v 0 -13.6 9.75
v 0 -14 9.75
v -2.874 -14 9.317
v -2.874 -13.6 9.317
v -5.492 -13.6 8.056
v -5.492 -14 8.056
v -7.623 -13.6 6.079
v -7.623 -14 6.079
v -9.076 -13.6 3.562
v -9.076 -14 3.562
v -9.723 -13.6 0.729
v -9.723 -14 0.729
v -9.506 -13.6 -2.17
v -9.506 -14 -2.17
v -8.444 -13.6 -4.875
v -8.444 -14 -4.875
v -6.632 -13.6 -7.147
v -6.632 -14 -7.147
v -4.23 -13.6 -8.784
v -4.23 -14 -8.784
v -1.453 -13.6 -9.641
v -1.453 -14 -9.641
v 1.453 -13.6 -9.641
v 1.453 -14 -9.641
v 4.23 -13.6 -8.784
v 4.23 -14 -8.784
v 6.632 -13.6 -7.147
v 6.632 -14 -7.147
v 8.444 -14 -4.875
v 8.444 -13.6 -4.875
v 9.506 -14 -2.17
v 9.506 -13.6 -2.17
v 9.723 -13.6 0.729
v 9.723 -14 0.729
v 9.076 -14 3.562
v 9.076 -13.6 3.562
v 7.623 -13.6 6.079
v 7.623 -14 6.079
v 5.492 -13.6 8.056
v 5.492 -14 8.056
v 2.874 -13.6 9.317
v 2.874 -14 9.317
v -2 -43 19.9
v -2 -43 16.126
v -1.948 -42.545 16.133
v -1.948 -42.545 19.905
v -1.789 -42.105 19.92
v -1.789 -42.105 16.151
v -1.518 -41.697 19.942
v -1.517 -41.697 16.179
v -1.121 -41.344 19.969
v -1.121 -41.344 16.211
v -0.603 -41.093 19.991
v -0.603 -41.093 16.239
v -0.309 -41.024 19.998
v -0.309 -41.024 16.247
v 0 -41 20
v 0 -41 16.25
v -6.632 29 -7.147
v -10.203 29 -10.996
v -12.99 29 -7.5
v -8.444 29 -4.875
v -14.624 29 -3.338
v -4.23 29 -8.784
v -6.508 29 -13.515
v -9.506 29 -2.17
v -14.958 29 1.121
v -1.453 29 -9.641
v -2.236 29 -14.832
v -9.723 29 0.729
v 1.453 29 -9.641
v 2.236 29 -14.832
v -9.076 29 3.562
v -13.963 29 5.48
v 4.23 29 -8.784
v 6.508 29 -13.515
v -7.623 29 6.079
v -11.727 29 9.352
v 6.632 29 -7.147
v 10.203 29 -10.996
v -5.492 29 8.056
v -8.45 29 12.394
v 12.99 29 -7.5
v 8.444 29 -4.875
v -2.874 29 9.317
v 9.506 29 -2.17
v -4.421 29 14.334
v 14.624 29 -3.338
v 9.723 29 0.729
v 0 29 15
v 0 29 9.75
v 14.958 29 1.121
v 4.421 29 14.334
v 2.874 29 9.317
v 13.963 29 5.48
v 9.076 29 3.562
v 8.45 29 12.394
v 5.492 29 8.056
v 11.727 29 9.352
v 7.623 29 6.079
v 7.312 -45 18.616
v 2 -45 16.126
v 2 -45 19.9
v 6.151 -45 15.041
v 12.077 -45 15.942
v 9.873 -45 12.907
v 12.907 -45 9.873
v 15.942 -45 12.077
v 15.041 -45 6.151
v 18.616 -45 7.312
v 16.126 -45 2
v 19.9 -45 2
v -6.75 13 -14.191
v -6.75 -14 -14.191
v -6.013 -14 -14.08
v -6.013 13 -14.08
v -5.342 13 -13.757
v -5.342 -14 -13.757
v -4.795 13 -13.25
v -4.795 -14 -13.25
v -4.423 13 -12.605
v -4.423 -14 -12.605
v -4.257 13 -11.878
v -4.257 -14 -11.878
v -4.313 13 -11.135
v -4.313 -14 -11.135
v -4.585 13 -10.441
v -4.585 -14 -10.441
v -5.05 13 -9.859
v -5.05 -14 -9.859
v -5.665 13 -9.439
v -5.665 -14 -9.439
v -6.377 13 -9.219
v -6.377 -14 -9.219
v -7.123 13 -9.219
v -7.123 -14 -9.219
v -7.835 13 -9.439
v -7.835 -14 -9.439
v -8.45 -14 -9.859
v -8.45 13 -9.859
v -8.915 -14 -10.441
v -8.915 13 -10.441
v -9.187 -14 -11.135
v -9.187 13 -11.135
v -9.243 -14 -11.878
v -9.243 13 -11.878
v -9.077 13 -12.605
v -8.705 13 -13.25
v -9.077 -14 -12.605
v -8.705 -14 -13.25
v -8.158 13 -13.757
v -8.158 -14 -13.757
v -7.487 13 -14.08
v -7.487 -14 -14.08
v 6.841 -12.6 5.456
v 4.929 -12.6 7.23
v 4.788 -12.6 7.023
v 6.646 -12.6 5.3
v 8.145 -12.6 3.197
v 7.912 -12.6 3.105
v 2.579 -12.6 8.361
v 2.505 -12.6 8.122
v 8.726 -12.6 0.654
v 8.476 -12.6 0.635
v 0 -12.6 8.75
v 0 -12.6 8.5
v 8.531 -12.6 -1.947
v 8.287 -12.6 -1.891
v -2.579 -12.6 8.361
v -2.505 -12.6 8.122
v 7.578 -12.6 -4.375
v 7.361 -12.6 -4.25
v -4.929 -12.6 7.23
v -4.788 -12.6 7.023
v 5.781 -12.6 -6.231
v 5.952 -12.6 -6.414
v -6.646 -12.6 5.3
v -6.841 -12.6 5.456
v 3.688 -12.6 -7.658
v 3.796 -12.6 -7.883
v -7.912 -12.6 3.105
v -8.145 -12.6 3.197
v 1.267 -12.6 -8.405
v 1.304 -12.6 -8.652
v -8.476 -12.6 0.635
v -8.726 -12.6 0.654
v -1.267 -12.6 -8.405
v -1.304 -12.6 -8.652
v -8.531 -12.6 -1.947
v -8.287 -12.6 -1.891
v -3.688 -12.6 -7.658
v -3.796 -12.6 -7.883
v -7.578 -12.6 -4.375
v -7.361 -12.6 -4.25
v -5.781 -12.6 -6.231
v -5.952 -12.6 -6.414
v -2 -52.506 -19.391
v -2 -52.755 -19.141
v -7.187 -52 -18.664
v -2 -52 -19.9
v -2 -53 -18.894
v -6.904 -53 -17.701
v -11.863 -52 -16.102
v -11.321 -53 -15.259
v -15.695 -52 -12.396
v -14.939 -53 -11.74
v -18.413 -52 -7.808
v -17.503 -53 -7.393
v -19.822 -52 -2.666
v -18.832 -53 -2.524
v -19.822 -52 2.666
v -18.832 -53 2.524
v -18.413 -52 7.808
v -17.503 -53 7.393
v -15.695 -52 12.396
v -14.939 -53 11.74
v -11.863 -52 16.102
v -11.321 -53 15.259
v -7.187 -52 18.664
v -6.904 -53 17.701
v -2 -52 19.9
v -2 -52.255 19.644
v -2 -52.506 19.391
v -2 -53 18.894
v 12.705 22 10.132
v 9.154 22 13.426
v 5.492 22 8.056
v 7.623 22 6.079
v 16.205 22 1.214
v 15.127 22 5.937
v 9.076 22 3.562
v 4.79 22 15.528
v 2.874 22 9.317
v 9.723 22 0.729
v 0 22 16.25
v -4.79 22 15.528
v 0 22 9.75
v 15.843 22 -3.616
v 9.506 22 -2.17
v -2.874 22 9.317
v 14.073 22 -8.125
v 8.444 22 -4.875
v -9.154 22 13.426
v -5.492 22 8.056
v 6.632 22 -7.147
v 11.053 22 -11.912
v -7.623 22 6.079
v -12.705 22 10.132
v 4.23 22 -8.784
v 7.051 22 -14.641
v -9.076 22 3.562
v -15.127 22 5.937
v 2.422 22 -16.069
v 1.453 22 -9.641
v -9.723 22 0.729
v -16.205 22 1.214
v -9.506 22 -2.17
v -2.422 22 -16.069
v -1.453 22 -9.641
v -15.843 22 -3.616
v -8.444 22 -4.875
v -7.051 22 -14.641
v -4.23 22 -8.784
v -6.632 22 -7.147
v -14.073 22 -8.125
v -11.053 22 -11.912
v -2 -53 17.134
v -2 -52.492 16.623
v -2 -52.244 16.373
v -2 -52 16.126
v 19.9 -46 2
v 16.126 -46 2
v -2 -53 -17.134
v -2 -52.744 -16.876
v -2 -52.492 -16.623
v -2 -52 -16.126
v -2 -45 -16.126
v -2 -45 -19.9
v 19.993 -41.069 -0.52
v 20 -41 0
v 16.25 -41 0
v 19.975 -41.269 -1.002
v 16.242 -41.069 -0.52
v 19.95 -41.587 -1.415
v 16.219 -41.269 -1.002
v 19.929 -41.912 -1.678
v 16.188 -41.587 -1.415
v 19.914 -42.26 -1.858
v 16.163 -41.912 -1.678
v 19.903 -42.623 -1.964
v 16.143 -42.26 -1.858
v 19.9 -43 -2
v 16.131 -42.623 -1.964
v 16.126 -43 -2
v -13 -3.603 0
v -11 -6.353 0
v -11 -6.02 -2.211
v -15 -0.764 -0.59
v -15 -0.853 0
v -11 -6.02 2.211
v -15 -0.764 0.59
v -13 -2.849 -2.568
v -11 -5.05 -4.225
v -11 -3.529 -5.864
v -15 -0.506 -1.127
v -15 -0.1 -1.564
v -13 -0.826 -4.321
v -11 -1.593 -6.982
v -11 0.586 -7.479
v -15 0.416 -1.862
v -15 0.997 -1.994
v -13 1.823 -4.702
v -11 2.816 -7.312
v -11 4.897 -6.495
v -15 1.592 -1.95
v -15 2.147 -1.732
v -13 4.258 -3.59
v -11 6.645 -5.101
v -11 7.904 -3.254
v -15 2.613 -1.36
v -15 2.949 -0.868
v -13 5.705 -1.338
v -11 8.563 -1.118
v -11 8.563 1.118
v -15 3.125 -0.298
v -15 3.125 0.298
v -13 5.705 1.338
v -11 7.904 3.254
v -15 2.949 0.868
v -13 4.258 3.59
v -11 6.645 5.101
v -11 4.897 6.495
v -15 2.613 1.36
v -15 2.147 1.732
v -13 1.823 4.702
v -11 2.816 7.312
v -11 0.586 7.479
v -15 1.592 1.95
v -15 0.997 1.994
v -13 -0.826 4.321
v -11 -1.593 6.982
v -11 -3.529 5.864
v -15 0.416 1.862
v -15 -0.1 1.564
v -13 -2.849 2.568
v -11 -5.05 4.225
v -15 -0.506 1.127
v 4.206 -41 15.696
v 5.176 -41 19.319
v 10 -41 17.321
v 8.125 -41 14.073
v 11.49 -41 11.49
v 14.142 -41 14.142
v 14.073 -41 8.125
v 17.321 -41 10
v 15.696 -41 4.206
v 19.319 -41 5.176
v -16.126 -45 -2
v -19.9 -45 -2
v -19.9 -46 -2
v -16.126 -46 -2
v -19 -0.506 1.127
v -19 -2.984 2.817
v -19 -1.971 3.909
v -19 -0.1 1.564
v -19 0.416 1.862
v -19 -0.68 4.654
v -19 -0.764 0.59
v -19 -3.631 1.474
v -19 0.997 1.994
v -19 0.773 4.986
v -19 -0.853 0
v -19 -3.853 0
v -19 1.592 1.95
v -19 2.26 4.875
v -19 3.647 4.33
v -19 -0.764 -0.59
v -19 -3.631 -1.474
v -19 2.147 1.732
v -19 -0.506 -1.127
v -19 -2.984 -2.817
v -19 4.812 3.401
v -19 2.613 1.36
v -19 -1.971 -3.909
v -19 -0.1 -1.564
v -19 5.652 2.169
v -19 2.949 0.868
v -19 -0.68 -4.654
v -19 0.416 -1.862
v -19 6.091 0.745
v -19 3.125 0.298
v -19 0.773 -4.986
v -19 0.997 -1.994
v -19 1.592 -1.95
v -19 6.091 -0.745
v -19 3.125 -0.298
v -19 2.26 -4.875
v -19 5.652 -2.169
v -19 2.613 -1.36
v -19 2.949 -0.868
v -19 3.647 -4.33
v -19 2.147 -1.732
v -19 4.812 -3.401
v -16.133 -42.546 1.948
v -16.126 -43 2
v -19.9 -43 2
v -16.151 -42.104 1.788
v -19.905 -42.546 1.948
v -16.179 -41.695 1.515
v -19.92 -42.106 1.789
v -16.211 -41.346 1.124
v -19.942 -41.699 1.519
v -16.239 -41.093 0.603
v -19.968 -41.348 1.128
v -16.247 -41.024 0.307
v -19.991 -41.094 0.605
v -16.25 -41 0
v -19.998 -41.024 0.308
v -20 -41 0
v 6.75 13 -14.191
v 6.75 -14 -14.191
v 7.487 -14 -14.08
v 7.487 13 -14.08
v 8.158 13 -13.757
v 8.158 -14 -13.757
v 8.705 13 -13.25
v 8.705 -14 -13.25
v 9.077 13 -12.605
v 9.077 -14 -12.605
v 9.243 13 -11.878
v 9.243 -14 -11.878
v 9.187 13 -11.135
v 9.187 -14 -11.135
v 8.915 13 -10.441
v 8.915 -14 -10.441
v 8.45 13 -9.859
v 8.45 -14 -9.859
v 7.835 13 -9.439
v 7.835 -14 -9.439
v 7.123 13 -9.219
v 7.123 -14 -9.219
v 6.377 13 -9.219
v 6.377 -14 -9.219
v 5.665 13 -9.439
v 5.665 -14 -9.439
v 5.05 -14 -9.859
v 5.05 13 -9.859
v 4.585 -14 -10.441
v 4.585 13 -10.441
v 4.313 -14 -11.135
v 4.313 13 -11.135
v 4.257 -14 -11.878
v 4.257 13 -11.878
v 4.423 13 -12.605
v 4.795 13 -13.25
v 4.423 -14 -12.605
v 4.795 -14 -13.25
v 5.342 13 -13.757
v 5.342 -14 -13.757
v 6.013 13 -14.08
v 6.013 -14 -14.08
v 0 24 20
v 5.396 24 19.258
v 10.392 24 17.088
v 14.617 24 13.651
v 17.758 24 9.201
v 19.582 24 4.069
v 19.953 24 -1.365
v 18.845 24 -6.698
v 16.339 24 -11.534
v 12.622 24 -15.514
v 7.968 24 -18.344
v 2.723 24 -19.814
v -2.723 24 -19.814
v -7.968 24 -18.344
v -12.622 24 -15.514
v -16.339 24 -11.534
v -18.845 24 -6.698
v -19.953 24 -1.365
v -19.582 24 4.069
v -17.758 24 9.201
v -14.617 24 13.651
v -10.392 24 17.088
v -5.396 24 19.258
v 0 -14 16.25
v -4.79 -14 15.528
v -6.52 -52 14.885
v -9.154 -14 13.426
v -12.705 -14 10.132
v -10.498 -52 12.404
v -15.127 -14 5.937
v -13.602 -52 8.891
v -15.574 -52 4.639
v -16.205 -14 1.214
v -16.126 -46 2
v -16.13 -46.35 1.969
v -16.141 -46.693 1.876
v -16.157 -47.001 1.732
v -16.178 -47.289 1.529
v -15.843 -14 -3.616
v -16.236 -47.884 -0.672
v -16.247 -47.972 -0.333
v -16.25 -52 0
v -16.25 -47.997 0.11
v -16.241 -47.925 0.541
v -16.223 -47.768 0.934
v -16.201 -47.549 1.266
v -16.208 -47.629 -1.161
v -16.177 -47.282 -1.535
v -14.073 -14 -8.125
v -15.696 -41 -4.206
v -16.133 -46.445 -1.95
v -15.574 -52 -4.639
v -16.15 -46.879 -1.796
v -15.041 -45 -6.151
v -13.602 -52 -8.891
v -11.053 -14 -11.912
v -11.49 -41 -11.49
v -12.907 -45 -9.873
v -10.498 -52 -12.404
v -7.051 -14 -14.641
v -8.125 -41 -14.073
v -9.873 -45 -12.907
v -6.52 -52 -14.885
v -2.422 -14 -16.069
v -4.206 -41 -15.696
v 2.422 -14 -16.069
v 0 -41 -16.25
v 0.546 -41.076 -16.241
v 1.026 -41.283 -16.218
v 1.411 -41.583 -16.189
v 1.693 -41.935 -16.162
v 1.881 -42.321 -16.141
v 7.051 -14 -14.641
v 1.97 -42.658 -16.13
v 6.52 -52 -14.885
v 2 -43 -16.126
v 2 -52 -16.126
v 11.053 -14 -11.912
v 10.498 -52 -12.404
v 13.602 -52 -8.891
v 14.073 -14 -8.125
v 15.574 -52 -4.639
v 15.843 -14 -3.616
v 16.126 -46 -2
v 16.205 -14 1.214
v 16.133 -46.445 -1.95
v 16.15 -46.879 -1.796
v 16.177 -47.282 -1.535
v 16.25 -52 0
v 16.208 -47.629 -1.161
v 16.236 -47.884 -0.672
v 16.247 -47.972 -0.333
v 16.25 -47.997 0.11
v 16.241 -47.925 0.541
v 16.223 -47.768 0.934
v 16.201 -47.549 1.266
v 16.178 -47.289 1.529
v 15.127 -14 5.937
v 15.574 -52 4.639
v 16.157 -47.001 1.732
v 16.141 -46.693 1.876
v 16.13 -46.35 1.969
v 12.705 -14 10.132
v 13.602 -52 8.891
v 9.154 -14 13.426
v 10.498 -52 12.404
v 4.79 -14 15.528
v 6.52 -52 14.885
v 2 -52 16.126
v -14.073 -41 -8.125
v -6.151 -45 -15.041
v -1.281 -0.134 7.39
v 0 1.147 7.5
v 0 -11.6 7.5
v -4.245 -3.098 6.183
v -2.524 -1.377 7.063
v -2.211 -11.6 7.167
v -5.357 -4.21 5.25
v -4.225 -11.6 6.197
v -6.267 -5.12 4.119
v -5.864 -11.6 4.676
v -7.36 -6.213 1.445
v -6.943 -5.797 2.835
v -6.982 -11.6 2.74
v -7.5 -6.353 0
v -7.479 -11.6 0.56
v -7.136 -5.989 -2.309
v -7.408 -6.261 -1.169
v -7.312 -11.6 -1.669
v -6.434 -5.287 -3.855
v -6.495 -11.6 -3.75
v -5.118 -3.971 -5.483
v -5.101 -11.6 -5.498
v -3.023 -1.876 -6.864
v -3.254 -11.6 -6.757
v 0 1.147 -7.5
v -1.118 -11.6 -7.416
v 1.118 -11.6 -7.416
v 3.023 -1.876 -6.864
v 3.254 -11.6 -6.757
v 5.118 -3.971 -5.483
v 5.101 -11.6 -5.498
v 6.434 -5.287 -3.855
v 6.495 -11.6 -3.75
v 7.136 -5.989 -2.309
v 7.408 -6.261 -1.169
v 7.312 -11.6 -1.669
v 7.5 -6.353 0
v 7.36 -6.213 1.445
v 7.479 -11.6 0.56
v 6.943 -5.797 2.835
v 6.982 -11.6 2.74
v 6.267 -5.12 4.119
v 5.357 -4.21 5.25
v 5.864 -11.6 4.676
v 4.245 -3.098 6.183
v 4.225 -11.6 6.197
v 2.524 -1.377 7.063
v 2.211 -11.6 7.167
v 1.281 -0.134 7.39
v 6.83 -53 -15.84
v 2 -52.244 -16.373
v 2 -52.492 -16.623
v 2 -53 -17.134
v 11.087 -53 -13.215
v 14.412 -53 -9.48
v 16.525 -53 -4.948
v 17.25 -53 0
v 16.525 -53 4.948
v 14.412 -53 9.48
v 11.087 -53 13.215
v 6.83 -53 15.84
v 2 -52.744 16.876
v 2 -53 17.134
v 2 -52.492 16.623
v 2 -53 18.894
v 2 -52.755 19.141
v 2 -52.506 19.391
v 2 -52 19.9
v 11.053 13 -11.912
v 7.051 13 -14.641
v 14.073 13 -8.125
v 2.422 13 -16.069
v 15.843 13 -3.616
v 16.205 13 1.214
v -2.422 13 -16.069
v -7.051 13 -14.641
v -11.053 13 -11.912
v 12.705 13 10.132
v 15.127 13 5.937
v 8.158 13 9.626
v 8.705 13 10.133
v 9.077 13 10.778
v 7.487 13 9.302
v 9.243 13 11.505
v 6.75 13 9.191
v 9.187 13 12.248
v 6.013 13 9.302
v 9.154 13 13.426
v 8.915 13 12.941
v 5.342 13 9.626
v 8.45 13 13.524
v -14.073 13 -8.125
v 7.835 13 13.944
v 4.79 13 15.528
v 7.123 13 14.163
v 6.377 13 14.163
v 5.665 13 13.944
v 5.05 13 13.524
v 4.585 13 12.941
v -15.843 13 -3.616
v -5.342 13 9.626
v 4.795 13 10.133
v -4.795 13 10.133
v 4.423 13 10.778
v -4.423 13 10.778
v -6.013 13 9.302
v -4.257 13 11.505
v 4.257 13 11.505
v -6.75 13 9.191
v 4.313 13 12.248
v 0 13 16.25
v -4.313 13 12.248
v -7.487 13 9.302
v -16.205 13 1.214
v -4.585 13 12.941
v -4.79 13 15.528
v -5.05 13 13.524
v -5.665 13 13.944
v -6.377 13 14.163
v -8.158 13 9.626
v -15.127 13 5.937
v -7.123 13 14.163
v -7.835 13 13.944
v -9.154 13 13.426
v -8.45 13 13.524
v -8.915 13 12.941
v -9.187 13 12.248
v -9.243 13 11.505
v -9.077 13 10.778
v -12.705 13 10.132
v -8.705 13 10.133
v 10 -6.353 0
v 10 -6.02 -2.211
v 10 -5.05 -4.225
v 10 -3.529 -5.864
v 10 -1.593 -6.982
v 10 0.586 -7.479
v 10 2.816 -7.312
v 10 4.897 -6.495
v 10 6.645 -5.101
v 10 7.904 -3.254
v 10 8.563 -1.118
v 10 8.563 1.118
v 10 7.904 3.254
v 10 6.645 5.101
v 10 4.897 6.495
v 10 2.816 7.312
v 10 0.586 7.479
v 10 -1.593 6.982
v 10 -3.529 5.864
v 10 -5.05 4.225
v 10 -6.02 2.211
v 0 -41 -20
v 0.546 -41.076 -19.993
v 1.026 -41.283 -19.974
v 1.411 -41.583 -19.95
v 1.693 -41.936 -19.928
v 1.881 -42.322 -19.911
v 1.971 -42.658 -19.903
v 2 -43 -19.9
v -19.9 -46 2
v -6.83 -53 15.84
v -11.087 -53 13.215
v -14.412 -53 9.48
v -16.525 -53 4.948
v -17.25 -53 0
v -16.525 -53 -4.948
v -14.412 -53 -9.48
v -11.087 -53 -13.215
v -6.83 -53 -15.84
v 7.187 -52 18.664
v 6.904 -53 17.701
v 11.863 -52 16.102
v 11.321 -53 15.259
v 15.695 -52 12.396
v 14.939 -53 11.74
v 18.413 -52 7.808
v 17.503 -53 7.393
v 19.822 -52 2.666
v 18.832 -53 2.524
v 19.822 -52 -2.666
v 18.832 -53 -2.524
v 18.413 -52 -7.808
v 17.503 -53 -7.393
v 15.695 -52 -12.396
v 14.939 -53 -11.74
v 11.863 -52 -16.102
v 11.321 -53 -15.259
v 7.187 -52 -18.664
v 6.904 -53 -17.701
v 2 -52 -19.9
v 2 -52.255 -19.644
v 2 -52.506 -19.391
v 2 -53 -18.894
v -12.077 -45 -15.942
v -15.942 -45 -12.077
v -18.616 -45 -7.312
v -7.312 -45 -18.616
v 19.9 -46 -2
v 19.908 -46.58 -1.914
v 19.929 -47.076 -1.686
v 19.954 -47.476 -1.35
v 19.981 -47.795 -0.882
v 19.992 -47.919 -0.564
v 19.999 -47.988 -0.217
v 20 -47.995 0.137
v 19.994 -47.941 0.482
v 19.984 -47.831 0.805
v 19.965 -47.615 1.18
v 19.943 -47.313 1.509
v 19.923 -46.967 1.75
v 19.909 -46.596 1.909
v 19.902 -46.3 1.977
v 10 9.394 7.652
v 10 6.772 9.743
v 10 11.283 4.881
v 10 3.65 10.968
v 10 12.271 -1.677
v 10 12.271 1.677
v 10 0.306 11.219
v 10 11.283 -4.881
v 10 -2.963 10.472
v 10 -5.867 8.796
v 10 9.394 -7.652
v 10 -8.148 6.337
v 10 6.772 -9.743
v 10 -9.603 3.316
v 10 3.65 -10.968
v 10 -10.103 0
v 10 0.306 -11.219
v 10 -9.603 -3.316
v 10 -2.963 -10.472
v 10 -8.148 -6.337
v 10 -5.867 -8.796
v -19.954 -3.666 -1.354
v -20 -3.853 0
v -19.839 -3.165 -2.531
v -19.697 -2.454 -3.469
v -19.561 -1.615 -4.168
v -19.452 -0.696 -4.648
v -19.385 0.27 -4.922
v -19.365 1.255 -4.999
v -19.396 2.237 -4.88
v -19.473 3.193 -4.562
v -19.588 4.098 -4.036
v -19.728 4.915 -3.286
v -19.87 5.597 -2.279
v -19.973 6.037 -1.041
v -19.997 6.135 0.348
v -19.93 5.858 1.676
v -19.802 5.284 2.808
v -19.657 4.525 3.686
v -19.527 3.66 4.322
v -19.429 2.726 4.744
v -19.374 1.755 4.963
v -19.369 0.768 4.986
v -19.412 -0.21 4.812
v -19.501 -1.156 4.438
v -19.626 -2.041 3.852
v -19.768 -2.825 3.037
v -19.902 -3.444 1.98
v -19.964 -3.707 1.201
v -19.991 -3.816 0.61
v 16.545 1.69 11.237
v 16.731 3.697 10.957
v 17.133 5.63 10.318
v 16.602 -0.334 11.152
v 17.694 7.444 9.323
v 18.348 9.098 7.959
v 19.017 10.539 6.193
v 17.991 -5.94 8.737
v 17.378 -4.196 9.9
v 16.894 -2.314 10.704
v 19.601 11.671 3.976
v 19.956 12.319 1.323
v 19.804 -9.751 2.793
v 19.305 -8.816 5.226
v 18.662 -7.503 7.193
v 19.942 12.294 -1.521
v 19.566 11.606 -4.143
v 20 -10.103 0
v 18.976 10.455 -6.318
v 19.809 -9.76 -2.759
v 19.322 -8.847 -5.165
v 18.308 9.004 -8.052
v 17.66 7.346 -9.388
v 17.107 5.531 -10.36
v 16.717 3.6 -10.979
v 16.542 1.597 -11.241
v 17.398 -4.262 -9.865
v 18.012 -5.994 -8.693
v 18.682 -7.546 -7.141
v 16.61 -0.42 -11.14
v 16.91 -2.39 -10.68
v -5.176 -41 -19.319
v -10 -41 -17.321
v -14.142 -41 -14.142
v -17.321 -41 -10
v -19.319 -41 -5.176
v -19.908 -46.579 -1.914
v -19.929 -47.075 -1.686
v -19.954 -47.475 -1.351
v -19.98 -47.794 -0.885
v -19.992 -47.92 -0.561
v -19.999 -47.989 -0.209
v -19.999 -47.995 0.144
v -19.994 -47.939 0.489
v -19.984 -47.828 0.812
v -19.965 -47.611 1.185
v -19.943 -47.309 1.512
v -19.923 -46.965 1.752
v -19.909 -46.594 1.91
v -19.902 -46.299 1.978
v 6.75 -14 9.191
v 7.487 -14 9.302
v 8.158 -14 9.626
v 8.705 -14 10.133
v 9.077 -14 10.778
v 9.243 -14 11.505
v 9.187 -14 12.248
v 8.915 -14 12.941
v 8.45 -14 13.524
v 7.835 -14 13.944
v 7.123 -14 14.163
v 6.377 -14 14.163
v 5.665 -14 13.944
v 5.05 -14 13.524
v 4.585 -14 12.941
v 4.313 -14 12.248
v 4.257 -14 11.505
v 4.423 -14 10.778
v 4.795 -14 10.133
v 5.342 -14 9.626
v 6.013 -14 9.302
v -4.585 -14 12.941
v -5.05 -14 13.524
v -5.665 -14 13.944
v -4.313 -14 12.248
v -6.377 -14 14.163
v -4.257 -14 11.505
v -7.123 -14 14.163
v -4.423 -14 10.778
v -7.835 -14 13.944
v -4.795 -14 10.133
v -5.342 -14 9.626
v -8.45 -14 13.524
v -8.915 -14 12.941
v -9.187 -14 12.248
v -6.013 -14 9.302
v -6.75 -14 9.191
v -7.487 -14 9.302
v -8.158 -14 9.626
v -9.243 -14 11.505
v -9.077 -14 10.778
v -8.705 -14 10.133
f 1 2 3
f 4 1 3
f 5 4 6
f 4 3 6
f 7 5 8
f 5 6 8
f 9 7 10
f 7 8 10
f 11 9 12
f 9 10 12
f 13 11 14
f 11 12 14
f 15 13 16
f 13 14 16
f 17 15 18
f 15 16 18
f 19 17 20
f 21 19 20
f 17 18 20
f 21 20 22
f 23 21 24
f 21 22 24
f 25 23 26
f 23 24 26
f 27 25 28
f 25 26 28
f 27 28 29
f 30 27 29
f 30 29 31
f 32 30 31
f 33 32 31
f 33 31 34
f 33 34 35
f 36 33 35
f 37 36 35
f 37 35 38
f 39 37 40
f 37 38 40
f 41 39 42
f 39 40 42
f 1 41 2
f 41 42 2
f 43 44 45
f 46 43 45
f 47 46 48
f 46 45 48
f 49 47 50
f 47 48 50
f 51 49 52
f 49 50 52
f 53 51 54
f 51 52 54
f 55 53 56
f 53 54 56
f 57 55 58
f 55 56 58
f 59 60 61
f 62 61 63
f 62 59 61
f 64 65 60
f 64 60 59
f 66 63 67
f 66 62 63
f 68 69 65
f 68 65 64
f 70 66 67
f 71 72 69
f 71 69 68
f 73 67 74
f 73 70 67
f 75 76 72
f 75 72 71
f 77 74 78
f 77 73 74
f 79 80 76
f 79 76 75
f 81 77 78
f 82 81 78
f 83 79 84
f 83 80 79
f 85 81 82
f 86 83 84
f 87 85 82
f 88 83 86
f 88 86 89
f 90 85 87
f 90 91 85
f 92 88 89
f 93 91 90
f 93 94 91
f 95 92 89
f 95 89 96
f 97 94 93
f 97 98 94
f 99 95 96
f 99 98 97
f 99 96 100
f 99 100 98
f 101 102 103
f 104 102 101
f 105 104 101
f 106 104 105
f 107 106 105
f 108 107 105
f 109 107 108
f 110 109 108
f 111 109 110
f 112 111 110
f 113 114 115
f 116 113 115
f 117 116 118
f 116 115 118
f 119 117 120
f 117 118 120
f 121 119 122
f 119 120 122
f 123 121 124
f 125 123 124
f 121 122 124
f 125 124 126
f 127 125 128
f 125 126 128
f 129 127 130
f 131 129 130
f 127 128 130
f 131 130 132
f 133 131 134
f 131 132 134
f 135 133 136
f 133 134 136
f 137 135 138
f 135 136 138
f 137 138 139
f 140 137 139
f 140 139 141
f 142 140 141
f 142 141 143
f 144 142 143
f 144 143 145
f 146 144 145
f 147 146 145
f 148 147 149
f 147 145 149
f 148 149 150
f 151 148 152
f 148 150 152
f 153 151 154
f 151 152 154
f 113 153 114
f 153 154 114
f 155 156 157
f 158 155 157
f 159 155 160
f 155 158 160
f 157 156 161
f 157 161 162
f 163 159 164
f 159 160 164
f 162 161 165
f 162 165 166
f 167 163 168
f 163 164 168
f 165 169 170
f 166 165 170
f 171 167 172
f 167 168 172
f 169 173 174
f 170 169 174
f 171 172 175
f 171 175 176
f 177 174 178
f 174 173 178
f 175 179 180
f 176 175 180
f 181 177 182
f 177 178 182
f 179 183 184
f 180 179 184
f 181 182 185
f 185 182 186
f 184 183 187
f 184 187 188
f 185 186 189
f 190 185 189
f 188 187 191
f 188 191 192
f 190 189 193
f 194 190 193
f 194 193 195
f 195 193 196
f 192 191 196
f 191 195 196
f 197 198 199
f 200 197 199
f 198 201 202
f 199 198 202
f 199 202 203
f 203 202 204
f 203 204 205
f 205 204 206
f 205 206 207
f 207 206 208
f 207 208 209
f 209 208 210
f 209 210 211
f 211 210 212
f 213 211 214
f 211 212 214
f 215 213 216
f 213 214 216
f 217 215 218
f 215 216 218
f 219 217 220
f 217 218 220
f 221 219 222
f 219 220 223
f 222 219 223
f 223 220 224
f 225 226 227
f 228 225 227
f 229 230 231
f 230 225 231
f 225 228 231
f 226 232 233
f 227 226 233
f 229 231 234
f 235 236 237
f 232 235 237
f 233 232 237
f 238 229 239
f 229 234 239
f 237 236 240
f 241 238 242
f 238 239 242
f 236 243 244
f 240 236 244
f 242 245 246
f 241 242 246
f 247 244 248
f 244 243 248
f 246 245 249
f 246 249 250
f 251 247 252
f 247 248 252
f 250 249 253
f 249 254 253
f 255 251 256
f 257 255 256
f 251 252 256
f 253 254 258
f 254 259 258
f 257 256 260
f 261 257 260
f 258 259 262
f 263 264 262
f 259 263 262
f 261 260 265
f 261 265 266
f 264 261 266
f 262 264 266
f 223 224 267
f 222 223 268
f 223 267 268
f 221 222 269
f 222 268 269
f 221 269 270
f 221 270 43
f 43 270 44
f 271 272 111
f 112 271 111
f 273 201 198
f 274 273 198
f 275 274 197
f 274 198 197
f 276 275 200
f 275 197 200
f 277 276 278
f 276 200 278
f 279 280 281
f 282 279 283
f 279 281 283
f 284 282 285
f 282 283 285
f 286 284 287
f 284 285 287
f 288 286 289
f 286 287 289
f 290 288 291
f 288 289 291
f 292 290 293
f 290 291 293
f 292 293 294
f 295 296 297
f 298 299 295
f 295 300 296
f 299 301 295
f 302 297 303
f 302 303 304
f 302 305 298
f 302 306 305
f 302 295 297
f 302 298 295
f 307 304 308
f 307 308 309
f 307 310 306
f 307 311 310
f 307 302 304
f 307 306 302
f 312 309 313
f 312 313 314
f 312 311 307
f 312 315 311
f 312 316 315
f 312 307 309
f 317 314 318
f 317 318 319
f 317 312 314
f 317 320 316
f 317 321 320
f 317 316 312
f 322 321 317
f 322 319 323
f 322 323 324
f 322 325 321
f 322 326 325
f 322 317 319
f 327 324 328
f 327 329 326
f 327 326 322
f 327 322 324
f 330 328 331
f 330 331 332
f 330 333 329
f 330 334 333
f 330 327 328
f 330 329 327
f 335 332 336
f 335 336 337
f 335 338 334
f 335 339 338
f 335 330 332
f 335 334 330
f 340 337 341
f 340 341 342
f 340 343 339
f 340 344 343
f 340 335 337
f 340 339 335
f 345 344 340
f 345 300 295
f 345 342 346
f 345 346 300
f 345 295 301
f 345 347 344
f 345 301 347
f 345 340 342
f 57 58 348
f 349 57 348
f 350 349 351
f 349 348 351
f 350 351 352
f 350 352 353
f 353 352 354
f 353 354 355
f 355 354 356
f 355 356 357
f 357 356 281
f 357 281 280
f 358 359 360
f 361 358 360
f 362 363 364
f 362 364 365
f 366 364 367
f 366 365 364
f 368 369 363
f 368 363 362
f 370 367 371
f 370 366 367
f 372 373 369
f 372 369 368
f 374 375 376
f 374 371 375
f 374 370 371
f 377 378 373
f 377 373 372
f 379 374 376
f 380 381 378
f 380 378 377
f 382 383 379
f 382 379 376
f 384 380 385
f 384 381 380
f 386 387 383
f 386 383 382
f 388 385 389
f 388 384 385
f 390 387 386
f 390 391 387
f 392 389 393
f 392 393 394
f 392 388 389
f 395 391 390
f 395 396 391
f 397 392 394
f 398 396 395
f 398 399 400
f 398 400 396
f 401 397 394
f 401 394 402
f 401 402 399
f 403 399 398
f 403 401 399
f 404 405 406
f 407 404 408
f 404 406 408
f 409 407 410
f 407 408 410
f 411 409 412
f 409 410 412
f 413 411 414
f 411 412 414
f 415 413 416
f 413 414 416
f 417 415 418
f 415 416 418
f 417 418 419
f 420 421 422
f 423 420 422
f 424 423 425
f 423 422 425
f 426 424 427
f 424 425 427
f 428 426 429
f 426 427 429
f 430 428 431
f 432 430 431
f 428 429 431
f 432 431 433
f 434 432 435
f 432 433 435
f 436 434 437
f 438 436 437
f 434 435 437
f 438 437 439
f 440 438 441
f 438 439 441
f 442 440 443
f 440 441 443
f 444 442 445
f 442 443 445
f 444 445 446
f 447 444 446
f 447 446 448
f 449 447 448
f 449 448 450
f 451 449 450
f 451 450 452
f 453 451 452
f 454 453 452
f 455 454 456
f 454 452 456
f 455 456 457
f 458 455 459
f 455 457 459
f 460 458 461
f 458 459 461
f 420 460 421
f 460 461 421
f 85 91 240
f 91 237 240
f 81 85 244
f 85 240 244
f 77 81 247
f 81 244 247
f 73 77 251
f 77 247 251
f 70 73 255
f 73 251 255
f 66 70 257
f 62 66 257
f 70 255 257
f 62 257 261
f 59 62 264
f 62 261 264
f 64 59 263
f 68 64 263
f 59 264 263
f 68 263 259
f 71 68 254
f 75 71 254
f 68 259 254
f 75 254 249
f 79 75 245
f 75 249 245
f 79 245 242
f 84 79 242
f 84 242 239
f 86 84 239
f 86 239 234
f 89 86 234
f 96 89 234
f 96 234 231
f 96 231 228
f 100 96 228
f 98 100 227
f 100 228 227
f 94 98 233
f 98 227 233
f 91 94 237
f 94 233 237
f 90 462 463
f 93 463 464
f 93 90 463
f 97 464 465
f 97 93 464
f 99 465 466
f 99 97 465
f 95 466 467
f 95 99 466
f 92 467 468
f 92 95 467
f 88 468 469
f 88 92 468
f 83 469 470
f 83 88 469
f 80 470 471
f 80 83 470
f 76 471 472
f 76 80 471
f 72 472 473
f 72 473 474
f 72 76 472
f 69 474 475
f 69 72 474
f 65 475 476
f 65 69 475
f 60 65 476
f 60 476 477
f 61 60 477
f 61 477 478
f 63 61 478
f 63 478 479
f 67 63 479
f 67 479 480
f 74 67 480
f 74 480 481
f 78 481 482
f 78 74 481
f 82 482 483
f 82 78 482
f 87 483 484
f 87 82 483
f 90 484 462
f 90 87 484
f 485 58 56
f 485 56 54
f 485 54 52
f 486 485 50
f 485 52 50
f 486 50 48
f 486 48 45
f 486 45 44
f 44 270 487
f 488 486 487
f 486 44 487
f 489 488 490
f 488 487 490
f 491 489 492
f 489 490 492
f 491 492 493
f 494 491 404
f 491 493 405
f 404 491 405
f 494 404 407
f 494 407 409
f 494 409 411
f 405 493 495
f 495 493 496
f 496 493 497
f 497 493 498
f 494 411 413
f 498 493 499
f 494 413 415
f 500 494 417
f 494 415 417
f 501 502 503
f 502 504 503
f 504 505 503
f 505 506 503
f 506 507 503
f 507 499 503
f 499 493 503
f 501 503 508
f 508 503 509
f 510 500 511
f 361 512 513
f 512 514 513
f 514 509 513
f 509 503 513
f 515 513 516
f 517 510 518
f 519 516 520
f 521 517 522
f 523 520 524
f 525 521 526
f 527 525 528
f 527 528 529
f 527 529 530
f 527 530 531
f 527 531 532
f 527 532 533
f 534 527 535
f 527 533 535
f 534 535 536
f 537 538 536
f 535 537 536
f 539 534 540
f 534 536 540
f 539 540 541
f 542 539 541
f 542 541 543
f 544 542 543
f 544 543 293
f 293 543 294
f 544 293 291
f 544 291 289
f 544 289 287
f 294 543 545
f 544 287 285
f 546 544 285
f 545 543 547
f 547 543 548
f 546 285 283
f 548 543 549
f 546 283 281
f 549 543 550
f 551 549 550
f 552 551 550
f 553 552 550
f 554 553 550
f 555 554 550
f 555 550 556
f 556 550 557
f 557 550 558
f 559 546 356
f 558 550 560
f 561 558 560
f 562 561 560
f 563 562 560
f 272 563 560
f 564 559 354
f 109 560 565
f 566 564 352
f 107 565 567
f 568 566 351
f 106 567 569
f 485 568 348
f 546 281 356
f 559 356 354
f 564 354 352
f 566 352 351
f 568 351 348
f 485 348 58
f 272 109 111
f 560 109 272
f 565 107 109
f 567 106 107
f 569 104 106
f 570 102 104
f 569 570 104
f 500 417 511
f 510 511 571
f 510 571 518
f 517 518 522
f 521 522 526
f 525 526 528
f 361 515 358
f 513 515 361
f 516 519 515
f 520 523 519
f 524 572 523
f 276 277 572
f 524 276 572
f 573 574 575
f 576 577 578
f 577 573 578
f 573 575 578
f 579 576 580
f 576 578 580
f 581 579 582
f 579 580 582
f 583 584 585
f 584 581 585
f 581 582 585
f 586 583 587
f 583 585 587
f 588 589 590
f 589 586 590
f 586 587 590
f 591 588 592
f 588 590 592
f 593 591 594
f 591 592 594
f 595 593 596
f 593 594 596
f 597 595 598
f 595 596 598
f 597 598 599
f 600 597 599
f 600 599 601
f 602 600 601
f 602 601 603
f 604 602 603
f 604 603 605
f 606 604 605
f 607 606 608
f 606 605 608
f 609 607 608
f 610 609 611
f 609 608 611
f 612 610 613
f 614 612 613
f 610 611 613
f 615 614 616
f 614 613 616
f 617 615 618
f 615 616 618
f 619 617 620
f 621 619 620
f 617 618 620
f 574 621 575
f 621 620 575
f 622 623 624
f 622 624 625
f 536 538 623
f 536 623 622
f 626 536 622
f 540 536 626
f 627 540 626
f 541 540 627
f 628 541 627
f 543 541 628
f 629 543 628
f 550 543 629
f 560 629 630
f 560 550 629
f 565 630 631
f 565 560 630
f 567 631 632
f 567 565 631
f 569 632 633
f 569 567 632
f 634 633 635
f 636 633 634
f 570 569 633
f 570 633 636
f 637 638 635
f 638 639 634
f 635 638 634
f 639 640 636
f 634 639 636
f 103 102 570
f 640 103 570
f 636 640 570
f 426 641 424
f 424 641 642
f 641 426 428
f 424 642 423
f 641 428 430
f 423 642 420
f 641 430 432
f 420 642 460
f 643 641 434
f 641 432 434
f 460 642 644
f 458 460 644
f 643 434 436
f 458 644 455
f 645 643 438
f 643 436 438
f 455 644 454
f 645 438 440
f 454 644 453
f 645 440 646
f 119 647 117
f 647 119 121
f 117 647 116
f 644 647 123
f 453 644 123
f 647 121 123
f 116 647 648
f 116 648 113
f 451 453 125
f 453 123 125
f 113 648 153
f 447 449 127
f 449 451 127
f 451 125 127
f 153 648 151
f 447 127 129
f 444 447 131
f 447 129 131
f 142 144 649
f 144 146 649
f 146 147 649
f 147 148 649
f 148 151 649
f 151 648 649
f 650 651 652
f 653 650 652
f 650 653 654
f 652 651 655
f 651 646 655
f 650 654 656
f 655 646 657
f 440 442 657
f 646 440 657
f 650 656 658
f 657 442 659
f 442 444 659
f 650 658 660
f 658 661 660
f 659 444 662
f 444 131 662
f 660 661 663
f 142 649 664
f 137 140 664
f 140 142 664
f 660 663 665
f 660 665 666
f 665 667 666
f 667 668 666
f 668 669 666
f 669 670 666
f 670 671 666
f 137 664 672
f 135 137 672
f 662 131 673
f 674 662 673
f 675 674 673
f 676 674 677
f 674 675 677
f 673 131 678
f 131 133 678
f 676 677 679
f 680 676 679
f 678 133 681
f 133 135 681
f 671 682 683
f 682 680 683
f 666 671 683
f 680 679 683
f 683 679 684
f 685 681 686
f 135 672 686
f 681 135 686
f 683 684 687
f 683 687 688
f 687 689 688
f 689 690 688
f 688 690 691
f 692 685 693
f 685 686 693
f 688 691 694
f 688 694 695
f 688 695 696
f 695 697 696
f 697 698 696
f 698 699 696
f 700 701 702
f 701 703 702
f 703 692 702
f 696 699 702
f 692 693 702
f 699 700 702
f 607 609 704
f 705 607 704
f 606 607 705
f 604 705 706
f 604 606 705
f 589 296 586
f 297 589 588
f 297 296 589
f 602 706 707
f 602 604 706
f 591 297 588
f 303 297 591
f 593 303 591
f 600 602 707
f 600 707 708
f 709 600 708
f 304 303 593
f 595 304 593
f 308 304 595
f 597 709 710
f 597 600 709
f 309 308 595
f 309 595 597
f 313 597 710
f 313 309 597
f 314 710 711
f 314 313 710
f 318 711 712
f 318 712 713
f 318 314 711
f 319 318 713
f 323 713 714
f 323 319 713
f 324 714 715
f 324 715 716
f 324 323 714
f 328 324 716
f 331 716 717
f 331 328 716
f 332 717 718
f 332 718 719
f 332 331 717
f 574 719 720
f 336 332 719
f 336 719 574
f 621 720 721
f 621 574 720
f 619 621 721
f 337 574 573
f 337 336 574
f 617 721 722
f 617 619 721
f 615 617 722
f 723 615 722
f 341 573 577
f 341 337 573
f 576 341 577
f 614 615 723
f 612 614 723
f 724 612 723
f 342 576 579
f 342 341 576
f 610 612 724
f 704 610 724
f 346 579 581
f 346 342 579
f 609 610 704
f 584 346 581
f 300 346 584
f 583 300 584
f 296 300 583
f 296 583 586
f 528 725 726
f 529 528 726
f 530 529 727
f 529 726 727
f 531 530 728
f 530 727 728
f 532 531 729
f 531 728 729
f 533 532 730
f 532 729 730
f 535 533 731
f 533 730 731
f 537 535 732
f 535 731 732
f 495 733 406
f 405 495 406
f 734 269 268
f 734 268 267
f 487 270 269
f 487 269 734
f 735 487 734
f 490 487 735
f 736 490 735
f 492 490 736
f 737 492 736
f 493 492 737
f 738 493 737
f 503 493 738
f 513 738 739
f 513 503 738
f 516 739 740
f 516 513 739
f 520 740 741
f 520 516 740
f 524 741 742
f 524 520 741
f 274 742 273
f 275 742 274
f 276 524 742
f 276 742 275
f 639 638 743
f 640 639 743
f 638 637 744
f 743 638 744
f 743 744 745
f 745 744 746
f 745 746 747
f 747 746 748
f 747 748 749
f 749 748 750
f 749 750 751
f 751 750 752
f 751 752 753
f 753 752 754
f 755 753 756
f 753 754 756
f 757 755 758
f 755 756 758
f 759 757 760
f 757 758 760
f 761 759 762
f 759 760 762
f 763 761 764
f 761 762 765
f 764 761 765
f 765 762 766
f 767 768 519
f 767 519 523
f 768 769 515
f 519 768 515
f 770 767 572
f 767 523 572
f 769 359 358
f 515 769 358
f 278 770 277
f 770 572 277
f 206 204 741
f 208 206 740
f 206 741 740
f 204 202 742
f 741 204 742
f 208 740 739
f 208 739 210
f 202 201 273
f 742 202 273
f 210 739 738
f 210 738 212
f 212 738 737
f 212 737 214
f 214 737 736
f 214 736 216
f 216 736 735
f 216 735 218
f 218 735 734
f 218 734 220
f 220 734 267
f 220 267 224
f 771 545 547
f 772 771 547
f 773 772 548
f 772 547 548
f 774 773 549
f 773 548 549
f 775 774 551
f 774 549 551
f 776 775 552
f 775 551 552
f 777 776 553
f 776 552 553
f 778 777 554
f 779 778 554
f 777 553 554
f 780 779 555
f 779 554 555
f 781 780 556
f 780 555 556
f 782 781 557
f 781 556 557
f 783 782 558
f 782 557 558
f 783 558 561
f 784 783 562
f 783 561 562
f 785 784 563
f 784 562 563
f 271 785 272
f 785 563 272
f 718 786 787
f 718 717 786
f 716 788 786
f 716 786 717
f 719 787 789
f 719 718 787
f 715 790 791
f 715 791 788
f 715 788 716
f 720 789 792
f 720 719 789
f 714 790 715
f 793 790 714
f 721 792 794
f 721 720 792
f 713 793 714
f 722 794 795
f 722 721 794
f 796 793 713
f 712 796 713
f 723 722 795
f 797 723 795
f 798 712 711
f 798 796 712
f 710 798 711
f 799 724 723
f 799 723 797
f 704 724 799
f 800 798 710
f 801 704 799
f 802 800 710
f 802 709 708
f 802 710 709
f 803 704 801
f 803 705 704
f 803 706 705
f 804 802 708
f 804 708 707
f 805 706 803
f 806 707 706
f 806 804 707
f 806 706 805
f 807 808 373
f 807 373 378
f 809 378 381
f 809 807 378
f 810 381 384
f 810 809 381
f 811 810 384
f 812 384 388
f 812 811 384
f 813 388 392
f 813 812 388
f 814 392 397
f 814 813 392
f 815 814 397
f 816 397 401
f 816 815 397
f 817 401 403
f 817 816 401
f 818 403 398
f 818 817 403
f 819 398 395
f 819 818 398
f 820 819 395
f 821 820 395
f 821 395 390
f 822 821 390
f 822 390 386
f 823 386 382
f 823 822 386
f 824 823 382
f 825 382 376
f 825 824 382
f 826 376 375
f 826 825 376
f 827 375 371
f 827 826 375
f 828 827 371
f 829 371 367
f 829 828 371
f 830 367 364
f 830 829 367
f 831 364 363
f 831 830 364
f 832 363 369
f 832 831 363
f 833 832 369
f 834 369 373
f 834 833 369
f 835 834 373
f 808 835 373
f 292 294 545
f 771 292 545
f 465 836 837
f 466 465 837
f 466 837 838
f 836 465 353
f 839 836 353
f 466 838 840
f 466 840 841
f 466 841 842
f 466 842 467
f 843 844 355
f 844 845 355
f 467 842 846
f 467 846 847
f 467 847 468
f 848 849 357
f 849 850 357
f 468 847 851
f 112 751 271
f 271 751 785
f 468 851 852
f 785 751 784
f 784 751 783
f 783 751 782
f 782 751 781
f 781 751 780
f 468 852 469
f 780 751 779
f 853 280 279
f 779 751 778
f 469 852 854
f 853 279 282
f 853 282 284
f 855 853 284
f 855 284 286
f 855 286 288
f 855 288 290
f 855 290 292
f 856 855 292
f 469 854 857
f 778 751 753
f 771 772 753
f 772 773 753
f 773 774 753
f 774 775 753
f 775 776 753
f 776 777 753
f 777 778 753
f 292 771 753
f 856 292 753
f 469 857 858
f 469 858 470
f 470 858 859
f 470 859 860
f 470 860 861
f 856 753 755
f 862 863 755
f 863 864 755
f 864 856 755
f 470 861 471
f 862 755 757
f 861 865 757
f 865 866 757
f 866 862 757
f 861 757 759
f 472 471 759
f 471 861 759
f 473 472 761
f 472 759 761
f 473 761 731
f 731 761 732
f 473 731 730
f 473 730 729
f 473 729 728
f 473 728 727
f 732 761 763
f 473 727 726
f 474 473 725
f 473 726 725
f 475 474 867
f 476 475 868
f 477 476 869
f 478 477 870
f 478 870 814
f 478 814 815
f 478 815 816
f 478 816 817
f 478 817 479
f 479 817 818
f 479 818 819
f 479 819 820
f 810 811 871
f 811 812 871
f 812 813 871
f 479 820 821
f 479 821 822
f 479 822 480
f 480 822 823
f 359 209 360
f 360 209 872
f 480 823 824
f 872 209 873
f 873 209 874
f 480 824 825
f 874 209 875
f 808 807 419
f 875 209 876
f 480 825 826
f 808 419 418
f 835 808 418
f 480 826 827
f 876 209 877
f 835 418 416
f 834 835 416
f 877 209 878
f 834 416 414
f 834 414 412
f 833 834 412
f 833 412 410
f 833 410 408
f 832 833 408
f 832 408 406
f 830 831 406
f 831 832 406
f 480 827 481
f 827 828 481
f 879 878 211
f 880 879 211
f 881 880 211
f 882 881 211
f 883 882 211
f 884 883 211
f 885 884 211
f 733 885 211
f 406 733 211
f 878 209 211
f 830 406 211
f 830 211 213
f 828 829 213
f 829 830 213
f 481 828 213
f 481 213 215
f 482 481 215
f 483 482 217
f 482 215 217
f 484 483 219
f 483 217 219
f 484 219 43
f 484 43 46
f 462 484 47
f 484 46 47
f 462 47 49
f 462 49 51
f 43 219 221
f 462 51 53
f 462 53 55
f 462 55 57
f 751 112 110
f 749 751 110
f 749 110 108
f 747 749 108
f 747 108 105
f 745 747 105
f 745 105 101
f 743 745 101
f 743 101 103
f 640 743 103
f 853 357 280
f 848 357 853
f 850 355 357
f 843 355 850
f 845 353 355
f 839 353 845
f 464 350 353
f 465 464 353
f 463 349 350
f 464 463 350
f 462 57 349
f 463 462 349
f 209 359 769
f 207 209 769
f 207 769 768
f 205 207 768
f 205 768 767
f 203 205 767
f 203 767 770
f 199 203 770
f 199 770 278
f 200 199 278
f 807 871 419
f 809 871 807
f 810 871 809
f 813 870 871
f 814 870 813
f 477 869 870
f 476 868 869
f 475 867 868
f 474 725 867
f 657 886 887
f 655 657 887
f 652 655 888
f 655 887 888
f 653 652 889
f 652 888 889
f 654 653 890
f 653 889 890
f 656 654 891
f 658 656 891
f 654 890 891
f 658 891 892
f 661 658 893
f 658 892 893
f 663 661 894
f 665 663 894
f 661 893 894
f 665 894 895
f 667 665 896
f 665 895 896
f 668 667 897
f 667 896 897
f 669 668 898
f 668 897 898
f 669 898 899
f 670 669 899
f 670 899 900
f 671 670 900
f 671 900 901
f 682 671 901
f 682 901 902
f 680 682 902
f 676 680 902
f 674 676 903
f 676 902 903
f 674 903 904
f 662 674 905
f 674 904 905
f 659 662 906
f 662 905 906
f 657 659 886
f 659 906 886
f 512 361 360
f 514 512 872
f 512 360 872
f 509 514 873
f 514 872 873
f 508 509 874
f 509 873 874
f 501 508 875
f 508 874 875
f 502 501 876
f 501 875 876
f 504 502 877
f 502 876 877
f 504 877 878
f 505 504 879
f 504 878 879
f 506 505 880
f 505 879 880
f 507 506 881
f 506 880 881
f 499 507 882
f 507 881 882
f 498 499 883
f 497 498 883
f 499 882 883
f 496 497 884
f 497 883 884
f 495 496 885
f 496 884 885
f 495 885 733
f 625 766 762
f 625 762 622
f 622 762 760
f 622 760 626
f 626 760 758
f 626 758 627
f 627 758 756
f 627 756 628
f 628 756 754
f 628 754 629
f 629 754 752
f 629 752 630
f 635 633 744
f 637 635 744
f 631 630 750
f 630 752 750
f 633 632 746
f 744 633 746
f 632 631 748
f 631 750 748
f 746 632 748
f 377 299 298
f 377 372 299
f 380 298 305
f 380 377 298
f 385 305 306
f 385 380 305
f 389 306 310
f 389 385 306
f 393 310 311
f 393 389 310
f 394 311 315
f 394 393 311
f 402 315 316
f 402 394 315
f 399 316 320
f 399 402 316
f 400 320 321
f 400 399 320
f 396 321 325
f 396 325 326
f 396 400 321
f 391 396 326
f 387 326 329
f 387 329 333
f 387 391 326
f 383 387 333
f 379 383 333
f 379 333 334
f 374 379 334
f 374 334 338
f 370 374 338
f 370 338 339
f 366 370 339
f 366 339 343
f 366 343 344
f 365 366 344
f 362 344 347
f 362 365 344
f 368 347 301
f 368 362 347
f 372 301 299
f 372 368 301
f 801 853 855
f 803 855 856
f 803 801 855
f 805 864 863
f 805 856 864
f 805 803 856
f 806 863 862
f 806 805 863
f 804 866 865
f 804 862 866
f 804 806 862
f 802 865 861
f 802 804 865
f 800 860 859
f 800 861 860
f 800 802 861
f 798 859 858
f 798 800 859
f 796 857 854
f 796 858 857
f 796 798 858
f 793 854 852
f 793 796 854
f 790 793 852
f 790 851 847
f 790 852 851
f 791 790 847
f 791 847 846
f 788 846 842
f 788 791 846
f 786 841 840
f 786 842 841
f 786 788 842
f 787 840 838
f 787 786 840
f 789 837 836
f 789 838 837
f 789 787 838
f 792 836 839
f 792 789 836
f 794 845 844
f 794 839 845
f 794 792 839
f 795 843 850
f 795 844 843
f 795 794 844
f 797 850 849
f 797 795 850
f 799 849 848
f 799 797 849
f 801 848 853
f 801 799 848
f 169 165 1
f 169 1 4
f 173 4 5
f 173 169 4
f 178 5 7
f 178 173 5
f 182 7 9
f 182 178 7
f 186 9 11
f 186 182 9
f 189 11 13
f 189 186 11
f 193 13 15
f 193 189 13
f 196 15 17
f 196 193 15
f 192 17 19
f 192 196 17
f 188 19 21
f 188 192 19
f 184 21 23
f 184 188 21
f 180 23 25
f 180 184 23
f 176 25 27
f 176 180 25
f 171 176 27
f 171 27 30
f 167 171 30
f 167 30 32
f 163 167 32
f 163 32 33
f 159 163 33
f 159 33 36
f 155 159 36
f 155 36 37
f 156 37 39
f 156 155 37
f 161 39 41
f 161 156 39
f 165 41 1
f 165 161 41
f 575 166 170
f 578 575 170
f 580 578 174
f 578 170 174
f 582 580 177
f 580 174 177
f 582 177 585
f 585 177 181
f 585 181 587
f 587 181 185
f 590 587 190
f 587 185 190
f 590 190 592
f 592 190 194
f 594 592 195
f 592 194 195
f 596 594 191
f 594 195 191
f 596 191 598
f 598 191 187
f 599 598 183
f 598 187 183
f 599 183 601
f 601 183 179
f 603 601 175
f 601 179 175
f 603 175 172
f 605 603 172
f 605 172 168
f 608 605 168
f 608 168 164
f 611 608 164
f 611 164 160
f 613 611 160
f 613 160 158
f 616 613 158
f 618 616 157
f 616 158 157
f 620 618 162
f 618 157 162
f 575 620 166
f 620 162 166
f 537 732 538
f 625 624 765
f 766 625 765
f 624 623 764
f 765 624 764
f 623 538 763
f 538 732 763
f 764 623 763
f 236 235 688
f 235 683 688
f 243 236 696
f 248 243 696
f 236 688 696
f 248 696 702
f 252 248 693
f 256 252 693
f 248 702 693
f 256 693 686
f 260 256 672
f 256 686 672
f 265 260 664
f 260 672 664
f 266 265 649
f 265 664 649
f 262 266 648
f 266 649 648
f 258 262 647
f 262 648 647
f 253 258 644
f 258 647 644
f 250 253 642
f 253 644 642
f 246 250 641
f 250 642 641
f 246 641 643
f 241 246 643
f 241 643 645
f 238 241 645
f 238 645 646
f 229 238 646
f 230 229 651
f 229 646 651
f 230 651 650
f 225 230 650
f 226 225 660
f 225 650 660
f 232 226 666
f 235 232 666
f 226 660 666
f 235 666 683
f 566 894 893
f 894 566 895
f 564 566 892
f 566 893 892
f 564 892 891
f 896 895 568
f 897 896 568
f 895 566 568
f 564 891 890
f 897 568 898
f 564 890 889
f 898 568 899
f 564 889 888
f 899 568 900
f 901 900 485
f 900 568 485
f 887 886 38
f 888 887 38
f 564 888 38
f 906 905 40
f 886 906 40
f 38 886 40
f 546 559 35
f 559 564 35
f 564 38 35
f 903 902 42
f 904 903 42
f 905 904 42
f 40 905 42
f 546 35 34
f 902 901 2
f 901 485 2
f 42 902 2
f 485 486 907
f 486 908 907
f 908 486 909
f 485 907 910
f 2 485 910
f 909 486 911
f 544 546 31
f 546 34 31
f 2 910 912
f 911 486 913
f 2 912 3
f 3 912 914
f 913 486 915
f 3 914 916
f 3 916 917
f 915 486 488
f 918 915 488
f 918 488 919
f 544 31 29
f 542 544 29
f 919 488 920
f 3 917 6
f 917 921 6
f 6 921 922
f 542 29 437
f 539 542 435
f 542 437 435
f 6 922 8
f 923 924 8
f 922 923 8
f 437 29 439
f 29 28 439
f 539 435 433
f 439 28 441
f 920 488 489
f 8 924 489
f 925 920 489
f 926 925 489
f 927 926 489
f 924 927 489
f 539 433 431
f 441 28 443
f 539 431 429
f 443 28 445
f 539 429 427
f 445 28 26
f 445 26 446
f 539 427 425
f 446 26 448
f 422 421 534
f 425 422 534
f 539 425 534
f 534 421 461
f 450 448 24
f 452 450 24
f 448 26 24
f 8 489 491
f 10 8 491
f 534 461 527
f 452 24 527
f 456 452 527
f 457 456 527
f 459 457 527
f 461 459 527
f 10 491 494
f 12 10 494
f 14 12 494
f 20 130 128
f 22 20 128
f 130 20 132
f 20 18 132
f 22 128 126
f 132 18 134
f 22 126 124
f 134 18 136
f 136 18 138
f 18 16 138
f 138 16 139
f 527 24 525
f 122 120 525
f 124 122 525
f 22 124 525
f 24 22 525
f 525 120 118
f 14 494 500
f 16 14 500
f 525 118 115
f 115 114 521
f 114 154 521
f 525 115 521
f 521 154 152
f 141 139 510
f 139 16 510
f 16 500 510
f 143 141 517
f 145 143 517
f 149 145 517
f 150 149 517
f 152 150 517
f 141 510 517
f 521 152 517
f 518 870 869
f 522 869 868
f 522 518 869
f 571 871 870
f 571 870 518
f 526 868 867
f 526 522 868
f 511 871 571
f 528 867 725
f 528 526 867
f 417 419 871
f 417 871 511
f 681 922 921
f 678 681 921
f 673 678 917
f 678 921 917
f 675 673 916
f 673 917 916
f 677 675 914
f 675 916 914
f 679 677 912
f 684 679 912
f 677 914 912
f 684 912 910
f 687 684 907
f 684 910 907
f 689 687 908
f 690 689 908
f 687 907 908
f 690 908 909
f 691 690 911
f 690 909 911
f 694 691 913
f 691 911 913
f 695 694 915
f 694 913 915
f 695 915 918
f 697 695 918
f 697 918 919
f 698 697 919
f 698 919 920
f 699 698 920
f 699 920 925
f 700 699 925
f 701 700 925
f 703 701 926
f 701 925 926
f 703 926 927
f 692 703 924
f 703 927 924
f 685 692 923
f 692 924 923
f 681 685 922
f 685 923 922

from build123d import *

# Parameters (mm, degrees)
BOSS_EXTRUDE1_DEPTH      = 29
BOSS_EXTRUDE1_DEPTH_BACK = 53
SKETCH2_R                = 20
CHAMFER1_SIZE            = 5
CHAMFER3_SIZE            = 1
CUT_EXTRUDE1_DEPTH       = 61.074953251
CUT_EXTRUDE1_DEPTH_BACK  = 61.074953251
CUT_EXTRUDE2_DEPTH       = 61.074953261
CUT_EXTRUDE2_DEPTH_BACK  = 61.074953261
SKETCH9_W                = 39.403997472
SKETCH9_H                = 4
CUT_EXTRUDE3_DEPTH       = 61.074953261
SKETCH10_W               = 32.489089837
SKETCH10_H               = 4
CUT_EXTRUDE5_DEPTH       = 61.074953261
SKETCH12_R               = 2.5
CUT_EXTRUDE6_DEPTH       = 27


with BuildPart() as part:
    # Sketch2 → Boss-Extrude1 (new, two sides: drawn at the far end of the back side and taken through both)
    with BuildSketch(Plane(origin=(0, 0, 0), x_dir=(1, 0, 0), z_dir=(0, 1, 0)).offset(-BOSS_EXTRUDE1_DEPTH_BACK)):
        with Locations(Location((0, 0, 0), (0, 0, 270))):
            Circle(SKETCH2_R)
    extrude(amount=BOSS_EXTRUDE1_DEPTH + BOSS_EXTRUDE1_DEPTH_BACK)

    # Chamfer1
    chamfer1_edges = [part.edges().sort_by_distance(p)[0] for p in [
        (0, 29, -20),
    ]]
    chamfer(chamfer1_edges, length=CHAMFER1_SIZE)

    # Sketch3 → Cut-Revolve1 (revolve, cut)
    with BuildSketch(Plane.XY, mode=Mode.PRIVATE) as cut_revolve1_sk:
        Polygon((20, 1.146940532), (20, 12.396940532), (10, 12.396940532), (10, 8.646940532), (-11, 8.646940532), (-15, 3.146940532), (-19, 3.146940532), (-19, 6.146940532), (-20, 6.146940532), (-20, 1.146940532), align=None)
    revolve(cut_revolve1_sk.sketch.rotate(Axis((-20, 1.146940532, 0), (1, 0, 0)), 180), axis=Axis((-20, 1.146940532, 0), (1, 0, 0)), mode=Mode.SUBTRACT)

    # Sketch4 → Cut-Revolve2 (revolve, cut)
    with BuildSketch(Plane(origin=(0, 0, 0), x_dir=(0, 0, -1), z_dir=(1, 0, 0))):
        Polygon((0, 13), (0, 29), (-9.75, 29), (-9.75, 22), (-16.25, 22), (-16.25, 13), align=None)
        Polygon((0, -53), (0, 1.146940532), (-7.5, 1.146940532), (-7.5, -12.6), (-9.75, -12.6), (-9.75, -14), (-16.25, -14), (-16.25, -53), align=None)
    revolve(axis=Axis((0, 29, 0), (0, -1, 0)), mode=Mode.SUBTRACT)

    # Chamfer3
    chamfer3_edges = [part.edges().sort_by_distance(p)[0] for p in [
        (0, -12.6, -7.5),
        (0, -12.6, -9.75),
        (0, -53, -16.25),
        (0, -53, -20),
    ]]
    chamfer(chamfer3_edges, length=CHAMFER3_SIZE)

    # Sketch5 → Cut-Extrude1 (cut, two sides: drawn at the far end of the back side and taken through both)
    with BuildSketch(Plane(origin=(0, 0, 0), x_dir=(0, 0, -1), z_dir=(1, 0, 0)).offset(-CUT_EXTRUDE1_DEPTH_BACK)):
        with BuildLine():
            Line((2, -43), (2, -46))
            ThreePointArc((2, -46), (0, -48), (-2, -46))
            Line((-2, -46), (-2, -43))
            ThreePointArc((-2, -43), (0, -41), (2, -43))
        make_face()
    extrude(amount=CUT_EXTRUDE1_DEPTH + CUT_EXTRUDE1_DEPTH_BACK, mode=Mode.SUBTRACT)

    # Sketch6 → Cut-Extrude2 (cut, two sides: drawn at the far end of the back side and taken through both)
    with BuildSketch(Plane.XY.offset(-CUT_EXTRUDE2_DEPTH_BACK)):
        with BuildLine():
            Line((2, -43), (2, -63))
            ThreePointArc((2, -63), (0, -65), (-2, -63))
            Line((-2, -63), (-2, -43))
            ThreePointArc((-2, -43), (0, -41), (2, -43))
        make_face()
    extrude(amount=CUT_EXTRUDE2_DEPTH + CUT_EXTRUDE2_DEPTH_BACK, mode=Mode.SUBTRACT)

    # Sketch9 → Cut-Extrude3 (cut, through all)
    with BuildSketch(Plane.XY):
        with Locations((19.701998736, -43)):
            Rectangle(SKETCH9_W, SKETCH9_H)
    extrude(amount=CUT_EXTRUDE3_DEPTH, mode=Mode.SUBTRACT)

    # Sketch10 → Cut-Extrude5 (cut, through all)
    with BuildSketch(Plane.XY):
        with Locations((-16.244544919, -43)):
            Rectangle(SKETCH10_W, SKETCH10_H)
    extrude(amount=-CUT_EXTRUDE5_DEPTH, mode=Mode.SUBTRACT)

    # Sketch12 → Cut-Extrude6 (cut)
    with BuildSketch(Plane.XZ.offset(14)):
        with Locations(Location((6.75, 11.691342951, 0), (0, 0, 270))):
            Circle(SKETCH12_R)
        with Locations(Location((-6.75, 11.691342951, 0), (0, 0, 270))):
            Circle(SKETCH12_R)
        with Locations(Location((6.75, -11.691342951, 0), (0, 0, 270))):
            Circle(SKETCH12_R)
        with Locations(Location((-6.75, -11.691342951, 0), (0, 0, 270))):
            Circle(SKETCH12_R)
    extrude(amount=-CUT_EXTRUDE6_DEPTH, mode=Mode.SUBTRACT)


solid = part.part
